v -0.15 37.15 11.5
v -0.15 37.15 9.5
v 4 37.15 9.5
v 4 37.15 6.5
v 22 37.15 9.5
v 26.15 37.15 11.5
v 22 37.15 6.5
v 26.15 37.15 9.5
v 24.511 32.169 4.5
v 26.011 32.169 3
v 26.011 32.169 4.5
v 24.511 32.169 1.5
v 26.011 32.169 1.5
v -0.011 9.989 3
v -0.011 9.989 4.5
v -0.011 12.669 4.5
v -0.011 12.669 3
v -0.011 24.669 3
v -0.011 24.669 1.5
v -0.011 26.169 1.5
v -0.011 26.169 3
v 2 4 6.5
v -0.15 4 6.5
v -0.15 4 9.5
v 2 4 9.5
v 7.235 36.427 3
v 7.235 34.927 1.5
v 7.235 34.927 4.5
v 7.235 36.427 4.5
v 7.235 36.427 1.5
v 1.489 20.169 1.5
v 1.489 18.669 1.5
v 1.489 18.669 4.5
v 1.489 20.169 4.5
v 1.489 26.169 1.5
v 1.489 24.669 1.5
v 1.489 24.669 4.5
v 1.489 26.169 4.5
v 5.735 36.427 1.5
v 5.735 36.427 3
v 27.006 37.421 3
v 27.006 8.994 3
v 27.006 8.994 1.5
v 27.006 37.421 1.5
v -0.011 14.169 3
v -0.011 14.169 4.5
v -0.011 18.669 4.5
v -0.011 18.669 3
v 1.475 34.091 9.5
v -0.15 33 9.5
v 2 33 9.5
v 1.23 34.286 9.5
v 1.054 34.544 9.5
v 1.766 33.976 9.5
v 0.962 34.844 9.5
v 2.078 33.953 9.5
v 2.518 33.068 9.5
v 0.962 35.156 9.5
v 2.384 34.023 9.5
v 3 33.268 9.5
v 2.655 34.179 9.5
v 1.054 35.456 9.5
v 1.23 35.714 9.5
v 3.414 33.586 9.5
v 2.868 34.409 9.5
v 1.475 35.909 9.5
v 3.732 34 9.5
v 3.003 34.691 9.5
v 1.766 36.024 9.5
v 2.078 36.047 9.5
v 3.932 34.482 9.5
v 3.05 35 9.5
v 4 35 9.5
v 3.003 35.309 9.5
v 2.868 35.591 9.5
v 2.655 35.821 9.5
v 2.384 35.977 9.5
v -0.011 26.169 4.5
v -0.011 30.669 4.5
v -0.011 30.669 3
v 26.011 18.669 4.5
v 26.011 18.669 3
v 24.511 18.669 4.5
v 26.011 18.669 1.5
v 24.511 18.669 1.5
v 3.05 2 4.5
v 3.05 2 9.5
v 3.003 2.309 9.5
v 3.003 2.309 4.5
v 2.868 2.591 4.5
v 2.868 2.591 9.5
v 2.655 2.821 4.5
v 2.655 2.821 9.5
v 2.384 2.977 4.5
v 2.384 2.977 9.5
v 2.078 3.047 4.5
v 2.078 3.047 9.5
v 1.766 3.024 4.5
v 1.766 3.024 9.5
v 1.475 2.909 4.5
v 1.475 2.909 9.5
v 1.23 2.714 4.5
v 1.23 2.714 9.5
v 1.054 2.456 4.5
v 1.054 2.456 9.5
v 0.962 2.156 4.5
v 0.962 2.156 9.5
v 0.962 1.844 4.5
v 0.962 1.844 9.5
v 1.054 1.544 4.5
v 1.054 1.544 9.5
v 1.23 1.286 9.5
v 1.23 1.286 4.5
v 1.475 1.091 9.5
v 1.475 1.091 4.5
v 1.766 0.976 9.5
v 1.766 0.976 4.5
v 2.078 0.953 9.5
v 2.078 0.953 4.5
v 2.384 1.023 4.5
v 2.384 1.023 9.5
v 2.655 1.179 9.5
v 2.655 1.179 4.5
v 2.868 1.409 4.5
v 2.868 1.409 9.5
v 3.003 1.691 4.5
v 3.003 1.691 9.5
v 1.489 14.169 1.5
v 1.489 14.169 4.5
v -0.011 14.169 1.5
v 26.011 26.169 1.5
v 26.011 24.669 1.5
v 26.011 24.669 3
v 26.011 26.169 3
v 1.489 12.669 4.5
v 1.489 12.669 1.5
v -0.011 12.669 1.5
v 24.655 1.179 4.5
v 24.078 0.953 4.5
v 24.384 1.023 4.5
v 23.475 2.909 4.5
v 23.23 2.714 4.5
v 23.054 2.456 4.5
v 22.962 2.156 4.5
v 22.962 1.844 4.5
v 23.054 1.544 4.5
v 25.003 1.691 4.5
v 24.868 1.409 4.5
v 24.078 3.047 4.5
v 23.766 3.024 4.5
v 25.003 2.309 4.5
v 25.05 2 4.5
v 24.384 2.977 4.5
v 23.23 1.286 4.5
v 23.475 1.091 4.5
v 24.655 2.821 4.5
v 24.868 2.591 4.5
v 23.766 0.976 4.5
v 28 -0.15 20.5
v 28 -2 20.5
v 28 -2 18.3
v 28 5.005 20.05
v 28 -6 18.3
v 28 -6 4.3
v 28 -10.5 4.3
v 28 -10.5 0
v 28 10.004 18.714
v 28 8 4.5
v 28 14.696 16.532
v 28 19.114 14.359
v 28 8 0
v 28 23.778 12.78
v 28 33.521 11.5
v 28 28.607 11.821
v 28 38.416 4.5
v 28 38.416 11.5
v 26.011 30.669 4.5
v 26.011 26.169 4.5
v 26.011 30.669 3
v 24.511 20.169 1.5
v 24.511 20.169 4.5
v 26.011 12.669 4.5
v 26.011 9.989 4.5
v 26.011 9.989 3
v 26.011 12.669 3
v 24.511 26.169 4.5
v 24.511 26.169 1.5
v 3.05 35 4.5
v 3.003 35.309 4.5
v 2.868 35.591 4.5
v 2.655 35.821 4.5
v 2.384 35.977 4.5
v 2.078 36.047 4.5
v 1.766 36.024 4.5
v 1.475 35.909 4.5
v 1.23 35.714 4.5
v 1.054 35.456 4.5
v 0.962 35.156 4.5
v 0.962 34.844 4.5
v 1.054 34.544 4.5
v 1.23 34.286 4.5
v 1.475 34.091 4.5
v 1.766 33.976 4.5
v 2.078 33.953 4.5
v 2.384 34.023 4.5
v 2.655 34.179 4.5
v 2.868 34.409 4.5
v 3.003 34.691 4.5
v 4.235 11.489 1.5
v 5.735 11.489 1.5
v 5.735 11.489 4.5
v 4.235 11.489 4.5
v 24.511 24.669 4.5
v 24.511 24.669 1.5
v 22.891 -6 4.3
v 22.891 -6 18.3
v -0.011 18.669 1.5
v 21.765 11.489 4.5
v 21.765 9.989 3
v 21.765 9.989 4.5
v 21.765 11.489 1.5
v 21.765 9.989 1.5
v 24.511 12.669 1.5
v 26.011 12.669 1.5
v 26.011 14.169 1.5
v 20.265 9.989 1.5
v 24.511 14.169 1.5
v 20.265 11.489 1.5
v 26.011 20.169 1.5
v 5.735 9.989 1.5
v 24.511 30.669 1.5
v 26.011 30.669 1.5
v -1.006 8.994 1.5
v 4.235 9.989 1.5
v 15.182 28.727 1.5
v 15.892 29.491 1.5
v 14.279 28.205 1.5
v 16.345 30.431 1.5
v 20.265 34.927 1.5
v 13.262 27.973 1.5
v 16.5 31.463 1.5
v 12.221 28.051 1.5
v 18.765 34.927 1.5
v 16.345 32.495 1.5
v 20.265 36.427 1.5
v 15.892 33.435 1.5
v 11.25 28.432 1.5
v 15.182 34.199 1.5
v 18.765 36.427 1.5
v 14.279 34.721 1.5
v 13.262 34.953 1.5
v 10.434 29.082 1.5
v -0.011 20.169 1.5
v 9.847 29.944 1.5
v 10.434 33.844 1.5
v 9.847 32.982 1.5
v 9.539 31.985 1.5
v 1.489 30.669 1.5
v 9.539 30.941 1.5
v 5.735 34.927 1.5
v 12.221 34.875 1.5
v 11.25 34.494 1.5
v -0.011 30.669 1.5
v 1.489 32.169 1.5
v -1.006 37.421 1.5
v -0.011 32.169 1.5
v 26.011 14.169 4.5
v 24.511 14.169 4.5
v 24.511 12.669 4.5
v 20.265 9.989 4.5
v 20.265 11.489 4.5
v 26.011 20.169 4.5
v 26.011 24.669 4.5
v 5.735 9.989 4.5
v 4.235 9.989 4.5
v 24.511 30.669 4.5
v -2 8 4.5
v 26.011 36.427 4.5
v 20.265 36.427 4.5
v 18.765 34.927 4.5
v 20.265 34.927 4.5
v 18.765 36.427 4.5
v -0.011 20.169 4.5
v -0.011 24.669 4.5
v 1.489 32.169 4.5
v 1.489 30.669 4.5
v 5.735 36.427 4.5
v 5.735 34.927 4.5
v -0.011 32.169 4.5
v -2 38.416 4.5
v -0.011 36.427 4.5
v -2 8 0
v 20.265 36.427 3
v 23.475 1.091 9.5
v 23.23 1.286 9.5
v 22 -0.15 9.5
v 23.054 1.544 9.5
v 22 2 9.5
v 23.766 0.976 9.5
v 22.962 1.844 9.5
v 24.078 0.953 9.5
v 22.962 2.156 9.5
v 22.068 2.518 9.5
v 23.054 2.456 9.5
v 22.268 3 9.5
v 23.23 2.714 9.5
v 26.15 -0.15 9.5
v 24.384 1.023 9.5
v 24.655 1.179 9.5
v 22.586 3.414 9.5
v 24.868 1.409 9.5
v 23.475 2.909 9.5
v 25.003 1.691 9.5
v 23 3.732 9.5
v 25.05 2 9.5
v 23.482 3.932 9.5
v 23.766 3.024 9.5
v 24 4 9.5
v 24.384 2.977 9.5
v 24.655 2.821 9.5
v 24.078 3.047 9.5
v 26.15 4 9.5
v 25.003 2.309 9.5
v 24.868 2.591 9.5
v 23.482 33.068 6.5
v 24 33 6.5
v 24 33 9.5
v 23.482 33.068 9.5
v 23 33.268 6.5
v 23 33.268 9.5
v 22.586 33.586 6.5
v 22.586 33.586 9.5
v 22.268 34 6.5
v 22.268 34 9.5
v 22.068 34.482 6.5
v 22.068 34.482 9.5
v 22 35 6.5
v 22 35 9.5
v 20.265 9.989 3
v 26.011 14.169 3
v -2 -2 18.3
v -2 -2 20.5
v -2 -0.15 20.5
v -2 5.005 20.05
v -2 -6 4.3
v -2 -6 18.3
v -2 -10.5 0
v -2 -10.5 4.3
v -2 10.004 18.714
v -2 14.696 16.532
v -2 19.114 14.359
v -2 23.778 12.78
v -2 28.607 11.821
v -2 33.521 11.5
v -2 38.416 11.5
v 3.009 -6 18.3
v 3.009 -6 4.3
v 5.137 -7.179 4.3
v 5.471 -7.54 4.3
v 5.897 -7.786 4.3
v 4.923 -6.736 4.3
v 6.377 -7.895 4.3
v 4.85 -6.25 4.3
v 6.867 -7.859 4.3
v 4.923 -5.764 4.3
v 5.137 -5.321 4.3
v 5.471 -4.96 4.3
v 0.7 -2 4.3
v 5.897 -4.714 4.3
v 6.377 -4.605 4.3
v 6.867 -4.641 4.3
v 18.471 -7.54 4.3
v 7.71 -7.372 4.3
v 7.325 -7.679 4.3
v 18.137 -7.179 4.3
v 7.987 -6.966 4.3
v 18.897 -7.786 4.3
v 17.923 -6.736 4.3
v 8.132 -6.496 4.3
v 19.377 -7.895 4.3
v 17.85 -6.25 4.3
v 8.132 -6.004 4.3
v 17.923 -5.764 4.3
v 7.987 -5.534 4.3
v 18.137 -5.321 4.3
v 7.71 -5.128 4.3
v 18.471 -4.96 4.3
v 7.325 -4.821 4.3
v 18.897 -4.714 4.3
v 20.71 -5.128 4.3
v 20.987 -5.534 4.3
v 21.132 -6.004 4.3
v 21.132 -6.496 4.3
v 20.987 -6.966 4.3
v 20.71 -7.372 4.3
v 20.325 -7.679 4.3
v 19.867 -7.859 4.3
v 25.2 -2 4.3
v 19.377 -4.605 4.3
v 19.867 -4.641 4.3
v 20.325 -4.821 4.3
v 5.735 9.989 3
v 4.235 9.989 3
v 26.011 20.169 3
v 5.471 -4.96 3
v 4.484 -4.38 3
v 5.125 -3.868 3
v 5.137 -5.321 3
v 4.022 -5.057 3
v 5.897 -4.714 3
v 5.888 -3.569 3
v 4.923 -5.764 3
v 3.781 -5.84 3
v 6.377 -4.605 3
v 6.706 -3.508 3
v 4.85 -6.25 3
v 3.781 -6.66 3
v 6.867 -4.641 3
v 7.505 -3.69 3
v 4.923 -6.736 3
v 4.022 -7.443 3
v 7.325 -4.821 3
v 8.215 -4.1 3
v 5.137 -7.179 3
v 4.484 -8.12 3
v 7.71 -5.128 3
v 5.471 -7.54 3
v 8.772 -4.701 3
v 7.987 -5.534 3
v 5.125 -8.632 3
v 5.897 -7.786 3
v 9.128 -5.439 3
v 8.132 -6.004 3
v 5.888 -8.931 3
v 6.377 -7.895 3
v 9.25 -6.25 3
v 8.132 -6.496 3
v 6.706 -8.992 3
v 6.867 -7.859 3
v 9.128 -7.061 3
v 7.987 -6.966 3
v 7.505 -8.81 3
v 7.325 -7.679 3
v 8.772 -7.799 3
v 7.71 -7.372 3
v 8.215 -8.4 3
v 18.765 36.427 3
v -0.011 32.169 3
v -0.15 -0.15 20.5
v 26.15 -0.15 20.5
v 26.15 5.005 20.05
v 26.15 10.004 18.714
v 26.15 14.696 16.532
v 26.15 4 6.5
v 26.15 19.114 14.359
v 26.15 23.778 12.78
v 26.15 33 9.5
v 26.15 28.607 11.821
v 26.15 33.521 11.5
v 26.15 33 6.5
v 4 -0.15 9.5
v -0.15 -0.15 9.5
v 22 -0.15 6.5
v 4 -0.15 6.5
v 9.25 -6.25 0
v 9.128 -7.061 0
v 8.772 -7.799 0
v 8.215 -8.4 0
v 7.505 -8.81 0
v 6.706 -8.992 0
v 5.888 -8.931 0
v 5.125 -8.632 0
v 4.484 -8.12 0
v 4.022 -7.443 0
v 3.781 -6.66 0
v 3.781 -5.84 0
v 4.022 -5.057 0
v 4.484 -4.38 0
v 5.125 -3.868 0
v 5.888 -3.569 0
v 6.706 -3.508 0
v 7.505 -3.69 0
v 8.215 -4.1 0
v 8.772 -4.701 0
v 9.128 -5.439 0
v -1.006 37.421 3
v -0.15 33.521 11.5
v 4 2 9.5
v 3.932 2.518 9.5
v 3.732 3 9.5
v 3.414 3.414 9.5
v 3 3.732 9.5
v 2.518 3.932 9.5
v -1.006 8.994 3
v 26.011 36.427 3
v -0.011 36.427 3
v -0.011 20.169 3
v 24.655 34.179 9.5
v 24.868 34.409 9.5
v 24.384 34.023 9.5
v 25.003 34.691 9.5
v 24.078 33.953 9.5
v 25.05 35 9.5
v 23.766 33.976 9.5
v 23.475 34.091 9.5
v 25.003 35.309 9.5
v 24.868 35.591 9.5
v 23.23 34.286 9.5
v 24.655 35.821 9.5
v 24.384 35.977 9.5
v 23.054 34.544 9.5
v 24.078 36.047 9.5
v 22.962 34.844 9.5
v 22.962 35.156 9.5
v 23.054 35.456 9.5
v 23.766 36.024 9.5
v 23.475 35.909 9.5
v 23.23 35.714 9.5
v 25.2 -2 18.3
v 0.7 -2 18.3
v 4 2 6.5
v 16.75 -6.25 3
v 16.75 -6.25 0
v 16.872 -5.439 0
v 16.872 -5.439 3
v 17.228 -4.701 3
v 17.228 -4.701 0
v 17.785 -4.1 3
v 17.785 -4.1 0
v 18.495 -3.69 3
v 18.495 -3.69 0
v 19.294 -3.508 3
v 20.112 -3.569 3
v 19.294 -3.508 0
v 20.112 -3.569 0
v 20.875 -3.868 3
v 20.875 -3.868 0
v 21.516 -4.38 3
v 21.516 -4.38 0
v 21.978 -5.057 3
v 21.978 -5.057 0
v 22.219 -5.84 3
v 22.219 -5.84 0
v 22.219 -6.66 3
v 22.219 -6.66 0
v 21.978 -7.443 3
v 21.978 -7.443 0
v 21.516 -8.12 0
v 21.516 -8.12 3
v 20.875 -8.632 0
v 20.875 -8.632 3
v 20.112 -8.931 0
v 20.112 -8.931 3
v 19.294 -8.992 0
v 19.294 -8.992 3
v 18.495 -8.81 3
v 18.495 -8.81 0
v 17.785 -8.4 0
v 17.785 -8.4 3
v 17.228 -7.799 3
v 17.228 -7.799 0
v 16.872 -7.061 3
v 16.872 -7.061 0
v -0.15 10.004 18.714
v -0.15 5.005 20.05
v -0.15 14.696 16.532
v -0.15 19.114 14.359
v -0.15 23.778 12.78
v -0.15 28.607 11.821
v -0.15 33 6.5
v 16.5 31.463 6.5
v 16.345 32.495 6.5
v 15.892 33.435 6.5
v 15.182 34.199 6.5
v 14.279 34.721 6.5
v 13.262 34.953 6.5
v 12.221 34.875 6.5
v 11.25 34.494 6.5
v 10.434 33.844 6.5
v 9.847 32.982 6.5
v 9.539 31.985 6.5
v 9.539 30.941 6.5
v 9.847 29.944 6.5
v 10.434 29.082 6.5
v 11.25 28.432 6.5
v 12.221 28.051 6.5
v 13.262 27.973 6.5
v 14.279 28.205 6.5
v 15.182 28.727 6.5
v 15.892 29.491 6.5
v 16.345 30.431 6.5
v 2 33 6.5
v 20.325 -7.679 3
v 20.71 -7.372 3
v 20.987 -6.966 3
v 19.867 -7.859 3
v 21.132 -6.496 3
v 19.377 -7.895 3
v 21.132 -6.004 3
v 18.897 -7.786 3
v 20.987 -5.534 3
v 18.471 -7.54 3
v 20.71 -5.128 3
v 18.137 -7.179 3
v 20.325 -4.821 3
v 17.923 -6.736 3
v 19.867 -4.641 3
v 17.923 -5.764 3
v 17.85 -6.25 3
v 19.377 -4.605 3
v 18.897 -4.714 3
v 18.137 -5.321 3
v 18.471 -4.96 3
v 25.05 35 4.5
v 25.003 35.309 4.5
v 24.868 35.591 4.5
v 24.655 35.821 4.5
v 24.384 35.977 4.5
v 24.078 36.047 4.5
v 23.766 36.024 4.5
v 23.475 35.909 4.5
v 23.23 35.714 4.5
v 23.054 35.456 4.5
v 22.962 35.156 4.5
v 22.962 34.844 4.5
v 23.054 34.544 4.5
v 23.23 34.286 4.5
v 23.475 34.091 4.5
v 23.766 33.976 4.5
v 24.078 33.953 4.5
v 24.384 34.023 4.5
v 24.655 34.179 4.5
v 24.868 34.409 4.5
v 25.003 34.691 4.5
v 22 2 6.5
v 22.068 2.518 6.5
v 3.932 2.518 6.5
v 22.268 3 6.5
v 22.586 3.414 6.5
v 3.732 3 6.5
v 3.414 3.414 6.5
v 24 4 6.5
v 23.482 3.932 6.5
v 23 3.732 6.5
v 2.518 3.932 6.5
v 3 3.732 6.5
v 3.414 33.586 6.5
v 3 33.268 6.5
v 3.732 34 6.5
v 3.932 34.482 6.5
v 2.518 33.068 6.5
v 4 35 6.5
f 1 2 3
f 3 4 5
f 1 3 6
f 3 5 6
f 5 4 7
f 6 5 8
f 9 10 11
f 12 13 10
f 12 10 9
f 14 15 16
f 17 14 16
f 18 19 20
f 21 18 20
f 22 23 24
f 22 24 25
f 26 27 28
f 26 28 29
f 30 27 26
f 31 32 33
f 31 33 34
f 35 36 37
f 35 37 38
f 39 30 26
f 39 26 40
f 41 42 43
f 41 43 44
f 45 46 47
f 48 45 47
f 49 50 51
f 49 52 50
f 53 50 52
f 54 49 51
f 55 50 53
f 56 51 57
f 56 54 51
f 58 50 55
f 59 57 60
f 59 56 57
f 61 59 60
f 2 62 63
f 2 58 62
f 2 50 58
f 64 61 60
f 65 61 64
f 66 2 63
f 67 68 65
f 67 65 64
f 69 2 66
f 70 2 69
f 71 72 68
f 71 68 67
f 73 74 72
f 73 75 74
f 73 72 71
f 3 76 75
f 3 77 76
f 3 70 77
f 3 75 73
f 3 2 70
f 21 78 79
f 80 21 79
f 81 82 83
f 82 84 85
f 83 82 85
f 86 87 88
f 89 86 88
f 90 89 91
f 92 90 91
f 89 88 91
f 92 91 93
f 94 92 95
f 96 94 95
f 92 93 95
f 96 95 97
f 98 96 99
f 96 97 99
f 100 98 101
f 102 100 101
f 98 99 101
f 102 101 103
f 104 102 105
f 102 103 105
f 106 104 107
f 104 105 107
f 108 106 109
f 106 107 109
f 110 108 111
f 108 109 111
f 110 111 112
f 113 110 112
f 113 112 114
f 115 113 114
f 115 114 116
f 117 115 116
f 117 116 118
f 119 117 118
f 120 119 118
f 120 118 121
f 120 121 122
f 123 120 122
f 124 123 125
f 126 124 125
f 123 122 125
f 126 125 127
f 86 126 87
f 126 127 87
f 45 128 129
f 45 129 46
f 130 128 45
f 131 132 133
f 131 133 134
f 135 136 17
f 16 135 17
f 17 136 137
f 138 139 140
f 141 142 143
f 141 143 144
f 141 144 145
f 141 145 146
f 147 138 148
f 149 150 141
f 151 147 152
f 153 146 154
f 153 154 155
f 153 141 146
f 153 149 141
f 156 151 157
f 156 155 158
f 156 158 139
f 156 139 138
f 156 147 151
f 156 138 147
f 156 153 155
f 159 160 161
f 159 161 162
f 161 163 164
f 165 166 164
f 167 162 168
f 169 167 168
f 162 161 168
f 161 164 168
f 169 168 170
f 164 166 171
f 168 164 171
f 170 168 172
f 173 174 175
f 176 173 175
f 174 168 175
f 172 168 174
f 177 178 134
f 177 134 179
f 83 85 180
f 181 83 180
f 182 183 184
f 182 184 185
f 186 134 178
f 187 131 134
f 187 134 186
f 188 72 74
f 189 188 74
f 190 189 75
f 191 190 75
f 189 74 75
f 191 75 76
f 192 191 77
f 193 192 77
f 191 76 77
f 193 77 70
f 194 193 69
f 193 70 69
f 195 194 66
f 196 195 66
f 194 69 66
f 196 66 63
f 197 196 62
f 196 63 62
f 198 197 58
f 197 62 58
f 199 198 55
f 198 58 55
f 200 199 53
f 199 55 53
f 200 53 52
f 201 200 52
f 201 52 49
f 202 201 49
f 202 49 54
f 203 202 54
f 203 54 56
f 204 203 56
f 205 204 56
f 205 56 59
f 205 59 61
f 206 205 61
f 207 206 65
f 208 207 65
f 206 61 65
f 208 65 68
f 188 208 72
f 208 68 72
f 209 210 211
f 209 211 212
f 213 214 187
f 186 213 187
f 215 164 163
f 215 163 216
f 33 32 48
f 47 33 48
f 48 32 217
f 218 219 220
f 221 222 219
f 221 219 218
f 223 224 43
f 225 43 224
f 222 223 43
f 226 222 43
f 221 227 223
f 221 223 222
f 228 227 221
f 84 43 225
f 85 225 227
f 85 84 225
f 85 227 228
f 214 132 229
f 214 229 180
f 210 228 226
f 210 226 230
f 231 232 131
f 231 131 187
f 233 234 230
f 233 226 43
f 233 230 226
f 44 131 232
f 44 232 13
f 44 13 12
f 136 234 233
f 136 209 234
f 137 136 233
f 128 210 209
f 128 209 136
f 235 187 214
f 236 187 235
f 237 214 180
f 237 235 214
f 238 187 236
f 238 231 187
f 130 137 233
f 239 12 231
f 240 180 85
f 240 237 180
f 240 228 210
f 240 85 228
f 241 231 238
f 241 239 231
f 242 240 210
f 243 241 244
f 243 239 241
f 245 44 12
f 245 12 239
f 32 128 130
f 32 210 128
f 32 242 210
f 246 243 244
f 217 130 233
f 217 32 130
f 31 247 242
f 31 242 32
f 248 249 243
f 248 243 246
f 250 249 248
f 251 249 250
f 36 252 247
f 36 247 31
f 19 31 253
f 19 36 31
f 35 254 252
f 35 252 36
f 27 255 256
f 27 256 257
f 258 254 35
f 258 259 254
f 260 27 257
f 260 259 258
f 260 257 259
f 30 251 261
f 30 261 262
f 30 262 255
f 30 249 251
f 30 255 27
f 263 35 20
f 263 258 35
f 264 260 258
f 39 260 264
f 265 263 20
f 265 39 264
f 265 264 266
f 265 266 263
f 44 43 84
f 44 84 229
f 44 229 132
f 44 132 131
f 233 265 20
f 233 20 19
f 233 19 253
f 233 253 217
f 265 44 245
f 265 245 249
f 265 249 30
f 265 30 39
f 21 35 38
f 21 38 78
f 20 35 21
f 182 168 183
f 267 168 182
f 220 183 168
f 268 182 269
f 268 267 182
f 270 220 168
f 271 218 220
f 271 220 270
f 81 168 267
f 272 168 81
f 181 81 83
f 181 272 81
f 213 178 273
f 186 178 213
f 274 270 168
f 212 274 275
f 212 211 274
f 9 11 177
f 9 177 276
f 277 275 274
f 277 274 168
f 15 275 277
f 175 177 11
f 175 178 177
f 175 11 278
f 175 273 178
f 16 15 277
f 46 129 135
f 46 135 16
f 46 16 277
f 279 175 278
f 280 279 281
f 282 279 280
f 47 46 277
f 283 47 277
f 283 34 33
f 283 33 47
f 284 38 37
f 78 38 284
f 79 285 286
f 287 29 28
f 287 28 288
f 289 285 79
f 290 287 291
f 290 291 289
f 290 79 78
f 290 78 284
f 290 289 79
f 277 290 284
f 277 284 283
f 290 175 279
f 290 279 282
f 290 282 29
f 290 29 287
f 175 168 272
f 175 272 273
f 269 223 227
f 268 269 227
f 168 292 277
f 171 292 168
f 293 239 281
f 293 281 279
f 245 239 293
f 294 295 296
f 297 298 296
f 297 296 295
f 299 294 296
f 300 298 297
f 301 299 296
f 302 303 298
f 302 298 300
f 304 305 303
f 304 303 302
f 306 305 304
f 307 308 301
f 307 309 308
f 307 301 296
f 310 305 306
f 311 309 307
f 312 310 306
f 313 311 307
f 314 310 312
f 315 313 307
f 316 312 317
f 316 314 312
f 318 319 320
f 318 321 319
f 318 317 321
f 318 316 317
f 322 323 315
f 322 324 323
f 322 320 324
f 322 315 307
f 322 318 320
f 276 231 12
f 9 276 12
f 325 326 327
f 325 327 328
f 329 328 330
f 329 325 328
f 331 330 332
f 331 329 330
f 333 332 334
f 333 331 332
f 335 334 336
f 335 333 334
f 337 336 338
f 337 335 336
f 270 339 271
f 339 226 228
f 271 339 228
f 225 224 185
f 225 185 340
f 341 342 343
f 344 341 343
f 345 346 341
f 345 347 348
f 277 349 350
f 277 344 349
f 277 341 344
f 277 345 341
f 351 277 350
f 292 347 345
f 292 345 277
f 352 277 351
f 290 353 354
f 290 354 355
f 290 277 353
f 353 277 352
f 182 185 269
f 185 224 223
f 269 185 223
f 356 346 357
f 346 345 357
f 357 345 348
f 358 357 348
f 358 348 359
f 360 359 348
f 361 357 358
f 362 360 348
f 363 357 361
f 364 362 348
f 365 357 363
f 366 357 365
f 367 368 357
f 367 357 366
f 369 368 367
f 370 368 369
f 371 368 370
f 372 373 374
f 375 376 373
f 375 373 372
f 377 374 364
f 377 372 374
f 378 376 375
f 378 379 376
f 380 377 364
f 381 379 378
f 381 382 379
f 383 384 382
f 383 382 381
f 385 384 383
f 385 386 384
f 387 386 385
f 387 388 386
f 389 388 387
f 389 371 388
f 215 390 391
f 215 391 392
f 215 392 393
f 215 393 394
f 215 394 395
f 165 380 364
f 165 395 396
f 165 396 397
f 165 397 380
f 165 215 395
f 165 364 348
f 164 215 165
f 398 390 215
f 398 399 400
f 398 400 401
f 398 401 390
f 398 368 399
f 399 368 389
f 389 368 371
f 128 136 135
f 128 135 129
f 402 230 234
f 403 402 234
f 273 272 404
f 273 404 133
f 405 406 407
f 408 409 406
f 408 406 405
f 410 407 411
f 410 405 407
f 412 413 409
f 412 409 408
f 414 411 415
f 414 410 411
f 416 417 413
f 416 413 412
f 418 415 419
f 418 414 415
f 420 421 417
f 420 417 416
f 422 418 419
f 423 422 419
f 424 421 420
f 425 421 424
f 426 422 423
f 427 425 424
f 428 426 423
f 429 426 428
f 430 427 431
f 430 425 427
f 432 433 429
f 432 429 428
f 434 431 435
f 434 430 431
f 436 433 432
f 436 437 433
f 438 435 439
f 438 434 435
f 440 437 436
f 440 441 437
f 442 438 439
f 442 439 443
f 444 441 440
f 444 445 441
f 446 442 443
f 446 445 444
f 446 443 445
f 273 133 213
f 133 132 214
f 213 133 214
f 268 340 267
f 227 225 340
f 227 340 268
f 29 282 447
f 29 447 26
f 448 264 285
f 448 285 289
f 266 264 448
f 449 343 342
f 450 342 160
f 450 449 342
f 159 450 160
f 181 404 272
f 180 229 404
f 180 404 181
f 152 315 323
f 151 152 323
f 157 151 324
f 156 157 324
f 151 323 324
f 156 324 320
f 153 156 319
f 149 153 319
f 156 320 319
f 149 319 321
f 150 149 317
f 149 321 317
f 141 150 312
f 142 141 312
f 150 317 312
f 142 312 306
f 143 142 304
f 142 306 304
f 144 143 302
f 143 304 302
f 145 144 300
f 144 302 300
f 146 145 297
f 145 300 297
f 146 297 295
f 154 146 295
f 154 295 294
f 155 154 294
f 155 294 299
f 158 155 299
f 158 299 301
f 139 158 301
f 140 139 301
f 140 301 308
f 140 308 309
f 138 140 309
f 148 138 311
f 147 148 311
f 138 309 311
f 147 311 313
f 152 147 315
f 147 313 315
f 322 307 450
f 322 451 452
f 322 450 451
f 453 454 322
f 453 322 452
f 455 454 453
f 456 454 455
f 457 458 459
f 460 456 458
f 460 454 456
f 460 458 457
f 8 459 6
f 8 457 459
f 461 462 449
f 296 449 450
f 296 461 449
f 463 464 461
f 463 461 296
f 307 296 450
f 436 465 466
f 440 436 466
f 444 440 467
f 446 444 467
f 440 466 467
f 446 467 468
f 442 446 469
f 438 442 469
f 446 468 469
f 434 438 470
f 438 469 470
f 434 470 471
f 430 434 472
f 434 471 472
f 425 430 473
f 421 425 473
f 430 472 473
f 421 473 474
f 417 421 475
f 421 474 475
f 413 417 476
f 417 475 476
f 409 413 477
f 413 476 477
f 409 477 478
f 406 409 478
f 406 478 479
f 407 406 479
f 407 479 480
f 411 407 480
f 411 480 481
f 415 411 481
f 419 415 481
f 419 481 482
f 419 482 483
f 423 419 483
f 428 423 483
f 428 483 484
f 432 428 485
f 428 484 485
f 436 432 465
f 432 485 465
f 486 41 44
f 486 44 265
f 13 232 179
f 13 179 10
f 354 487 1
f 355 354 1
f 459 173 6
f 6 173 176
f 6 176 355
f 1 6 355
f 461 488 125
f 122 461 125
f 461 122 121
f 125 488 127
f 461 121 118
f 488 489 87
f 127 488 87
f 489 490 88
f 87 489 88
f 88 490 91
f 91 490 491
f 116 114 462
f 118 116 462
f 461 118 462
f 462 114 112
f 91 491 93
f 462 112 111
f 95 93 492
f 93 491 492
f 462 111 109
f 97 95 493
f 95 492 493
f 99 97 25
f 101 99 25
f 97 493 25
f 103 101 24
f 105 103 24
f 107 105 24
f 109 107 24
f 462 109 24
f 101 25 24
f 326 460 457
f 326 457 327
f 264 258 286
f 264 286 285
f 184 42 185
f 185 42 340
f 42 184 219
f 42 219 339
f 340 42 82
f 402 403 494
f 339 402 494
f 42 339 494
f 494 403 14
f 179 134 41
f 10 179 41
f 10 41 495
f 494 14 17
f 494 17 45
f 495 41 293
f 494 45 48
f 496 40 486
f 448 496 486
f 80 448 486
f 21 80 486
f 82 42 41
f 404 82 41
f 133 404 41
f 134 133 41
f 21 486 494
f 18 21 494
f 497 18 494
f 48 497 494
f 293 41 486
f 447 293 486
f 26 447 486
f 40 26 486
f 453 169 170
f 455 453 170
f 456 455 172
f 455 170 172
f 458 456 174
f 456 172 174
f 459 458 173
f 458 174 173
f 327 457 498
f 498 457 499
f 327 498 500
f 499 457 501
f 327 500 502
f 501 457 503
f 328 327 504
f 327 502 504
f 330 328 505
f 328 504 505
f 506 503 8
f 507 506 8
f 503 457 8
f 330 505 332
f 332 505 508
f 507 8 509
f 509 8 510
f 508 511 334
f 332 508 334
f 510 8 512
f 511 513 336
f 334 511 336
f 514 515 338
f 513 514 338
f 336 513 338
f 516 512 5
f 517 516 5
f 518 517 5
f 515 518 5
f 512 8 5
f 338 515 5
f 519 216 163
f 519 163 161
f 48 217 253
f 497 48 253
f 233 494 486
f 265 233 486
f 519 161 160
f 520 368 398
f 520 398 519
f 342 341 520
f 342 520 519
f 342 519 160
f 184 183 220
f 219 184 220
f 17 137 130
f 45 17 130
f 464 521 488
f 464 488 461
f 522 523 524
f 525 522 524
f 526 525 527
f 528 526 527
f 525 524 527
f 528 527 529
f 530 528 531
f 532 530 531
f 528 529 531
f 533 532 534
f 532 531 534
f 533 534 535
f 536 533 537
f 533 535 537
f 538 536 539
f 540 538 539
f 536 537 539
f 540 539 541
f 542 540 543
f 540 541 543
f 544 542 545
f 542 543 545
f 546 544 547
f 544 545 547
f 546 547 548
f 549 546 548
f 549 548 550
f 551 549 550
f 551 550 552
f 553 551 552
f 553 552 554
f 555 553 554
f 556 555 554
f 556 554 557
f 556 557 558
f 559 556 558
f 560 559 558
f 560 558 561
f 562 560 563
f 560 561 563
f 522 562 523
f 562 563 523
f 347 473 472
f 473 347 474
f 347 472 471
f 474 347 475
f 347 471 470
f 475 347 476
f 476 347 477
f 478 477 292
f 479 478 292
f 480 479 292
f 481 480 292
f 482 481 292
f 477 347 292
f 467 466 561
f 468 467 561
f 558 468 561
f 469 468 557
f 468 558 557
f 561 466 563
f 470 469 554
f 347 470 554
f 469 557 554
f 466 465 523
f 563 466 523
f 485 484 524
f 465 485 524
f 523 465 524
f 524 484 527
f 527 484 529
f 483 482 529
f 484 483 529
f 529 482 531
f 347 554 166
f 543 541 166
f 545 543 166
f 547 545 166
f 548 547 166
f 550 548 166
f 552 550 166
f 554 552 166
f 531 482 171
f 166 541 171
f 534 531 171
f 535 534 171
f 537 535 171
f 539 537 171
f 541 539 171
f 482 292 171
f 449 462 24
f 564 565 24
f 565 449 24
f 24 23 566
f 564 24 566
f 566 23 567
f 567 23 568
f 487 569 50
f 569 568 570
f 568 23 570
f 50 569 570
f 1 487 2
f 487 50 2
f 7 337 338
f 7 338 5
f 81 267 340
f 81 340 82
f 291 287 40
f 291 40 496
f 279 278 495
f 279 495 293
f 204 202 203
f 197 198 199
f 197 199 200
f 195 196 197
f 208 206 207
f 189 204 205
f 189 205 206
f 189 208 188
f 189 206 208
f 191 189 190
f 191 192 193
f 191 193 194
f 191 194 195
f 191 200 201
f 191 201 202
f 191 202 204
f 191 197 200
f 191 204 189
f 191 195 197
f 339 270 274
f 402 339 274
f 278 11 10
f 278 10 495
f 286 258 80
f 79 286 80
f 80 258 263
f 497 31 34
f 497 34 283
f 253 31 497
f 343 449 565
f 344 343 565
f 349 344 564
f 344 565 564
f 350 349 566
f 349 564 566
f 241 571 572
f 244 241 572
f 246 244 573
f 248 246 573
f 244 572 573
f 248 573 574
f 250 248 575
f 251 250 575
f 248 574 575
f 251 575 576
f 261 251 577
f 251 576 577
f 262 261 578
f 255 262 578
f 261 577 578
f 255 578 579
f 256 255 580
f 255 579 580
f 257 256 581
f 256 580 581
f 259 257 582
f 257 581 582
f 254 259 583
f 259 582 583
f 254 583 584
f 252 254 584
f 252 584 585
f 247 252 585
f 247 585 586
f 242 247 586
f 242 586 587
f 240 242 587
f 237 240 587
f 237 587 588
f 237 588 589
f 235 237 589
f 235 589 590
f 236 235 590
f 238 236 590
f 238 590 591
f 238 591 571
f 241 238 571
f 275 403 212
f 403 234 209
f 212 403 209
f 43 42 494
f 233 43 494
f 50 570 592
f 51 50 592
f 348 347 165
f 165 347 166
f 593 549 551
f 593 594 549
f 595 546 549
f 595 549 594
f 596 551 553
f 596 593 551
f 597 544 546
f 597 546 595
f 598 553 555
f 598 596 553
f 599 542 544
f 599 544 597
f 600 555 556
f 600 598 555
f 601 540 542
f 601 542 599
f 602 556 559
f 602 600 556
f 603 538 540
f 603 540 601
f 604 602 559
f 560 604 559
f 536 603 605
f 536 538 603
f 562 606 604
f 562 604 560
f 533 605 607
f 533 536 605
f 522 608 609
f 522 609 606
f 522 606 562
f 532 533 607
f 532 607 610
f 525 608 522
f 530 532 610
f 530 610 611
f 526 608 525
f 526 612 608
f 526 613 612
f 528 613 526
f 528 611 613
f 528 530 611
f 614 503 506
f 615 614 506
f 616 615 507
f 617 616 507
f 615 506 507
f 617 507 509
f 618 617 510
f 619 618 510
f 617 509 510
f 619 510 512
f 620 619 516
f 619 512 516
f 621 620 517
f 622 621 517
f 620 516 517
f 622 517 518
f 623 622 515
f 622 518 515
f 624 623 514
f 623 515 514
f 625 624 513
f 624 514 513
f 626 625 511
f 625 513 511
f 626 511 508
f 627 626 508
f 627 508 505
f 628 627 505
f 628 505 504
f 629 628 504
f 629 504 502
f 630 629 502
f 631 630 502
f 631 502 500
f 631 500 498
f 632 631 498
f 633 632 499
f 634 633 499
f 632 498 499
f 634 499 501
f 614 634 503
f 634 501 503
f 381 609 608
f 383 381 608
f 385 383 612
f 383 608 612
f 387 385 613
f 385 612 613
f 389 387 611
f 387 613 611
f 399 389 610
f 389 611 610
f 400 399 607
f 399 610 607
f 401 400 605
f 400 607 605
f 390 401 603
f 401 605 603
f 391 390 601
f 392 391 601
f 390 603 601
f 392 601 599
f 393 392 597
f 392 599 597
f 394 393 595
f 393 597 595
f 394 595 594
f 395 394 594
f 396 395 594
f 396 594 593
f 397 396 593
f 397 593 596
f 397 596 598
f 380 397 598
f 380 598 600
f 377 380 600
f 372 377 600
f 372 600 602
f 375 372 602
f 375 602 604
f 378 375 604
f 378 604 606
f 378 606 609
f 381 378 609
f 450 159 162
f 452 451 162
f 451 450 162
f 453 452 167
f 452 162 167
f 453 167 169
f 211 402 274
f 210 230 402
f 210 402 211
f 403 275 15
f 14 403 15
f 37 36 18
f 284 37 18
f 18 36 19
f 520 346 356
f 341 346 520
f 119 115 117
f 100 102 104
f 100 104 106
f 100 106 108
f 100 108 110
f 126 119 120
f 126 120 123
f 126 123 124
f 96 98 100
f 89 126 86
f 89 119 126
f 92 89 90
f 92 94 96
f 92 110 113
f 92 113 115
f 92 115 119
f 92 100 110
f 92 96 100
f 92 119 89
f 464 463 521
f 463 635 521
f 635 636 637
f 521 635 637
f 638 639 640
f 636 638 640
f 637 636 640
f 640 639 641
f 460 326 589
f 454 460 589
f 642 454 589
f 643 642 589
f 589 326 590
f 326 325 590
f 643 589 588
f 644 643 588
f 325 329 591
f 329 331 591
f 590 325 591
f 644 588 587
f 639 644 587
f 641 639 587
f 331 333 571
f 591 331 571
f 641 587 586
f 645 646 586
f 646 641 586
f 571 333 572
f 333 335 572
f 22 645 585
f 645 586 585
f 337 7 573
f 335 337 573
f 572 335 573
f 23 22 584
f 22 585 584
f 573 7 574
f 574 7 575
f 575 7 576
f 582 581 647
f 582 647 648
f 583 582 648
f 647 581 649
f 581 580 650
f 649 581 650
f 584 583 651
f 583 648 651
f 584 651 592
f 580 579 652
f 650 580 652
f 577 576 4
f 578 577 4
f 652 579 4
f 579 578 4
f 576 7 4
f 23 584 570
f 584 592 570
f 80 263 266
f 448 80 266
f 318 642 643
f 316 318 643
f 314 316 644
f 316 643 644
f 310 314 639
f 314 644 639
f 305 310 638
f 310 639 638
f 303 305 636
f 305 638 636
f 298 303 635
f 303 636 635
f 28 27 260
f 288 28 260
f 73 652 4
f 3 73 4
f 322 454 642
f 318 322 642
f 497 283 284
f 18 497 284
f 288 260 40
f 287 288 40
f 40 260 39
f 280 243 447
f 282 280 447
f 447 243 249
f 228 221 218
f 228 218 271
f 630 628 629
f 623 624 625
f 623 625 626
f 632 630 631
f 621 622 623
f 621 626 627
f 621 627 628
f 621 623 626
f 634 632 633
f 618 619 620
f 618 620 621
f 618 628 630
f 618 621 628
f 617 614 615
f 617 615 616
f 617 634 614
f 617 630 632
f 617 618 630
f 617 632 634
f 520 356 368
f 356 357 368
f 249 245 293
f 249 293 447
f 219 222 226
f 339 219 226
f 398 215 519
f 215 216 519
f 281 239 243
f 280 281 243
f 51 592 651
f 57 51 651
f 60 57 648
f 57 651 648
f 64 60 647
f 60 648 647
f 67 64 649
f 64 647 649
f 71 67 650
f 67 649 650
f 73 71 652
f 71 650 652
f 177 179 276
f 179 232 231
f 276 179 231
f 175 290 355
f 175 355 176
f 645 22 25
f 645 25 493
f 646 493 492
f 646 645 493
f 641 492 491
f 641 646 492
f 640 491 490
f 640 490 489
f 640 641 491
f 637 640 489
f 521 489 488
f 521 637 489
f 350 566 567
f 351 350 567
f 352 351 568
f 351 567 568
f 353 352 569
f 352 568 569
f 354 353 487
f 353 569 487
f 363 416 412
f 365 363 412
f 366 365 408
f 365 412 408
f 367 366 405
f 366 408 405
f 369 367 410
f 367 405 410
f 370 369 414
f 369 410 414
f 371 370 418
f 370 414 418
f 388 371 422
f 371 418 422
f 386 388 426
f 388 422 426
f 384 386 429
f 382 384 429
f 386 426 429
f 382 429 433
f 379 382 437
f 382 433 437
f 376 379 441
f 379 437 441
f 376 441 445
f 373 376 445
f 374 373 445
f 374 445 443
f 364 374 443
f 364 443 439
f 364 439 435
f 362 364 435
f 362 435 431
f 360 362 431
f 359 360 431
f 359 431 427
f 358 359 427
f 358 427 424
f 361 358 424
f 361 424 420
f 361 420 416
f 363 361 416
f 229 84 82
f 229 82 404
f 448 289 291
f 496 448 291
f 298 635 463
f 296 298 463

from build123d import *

# Parameters (mm, degrees)
SKETCH2_W             = 30
SKETCH2_H             = 18.5
BOSS_EXTRUDE1_DEPTH   = 4.5
BOSS_EXTRUDE2_DEPTH   = 2
SKETCH4_W             = 26.3
SKETCH4_H             = 37.3
BOSS_EXTRUDE3_DEPTH   = 12
SKETCH5_W             = 30
SKETCH5_H             = 40.415903306
SKETCH5_W_2           = 26.3
SKETCH5_H_2           = 37.3
BOSS_EXTRUDE4_DEPTH   = 2
CUT_EXTRUDE1_DEPTH    = 53.877515324
SKETCH7_R             = 2.75
CUT_EXTRUDE2_DEPTH    = 3
SKETCH8_R             = 1.65
CUT_EXTRUDE3_DEPTH    = 51.656012741
SKETCH9_W             = 0.2
SKETCH9_H             = 4
TOLERANCE_CUT1_DEPTH  = 53.877515324
TOLERANCE_CUT2_DEPTH  = 0.2
BOSS_EXTRUDE5_DEPTH   = 3
SKETCH12_W            = 26.022193388
SKETCH12_H            = 26.438096694
BOSS_EXTRUDE6_DEPTH   = 1.5
SKETCH13_W            = 28.011096694
SKETCH13_H            = 28.427
BOSS_EXTRUDE7_DEPTH   = 1.5
SKETCH14_R            = 3.5
CUT_EXTRUDE6_DEPTH    = 50.555843518
SKETCH15_R            = 1.05
PCB_MOUNT_HOLES_DEPTH = 5
SKETCH16_W            = 1.5
SKETCH16_H            = 1.5
CUT_EXTRUDE8_DEPTH    = 3


with BuildPart() as part:
    # Sketch2 → Boss-Extrude1 (new body)
    with BuildSketch(Plane.XY):
        with Locations((13, -1.25)):
            Rectangle(SKETCH2_W, SKETCH2_H)
    extrude(amount=BOSS_EXTRUDE1_DEPTH)

    # Sketch3 → Boss-Extrude2 (add)
    with BuildSketch(Plane.XY.offset(4.5)):
        Polygon((-2, 38.415903306), (28, 38.415903306), (28, -6), (22.890598923, -6), (25.2, -2), (0.7, -2), (3.009401077, -6), (-2, -6), align=None)
    extrude(amount=BOSS_EXTRUDE2_DEPTH)

    # Sketch4 → Boss-Extrude3 (add)
    with BuildSketch(Plane.XY.offset(6.5)):
        Polygon((-2, 38.415903306), (-2, -6), (3.009401077, -6), (0.7, -2), (25.2, -2), (22.890598923, -6), (28, -6), (28, 38.415903306), align=None)
        with Locations((13, 18.5)):
            Rectangle(SKETCH4_W, SKETCH4_H, mode=Mode.SUBTRACT)
    extrude(amount=BOSS_EXTRUDE3_DEPTH)

    # Sketch5 → Boss-Extrude4 (add)
    with BuildSketch(Plane.XY.offset(18.5)):
        with Locations((13, 18.207951653)):
            Rectangle(SKETCH5_W, SKETCH5_H)
        with Locations((13, 18.5)):
            Rectangle(SKETCH5_W_2, SKETCH5_H_2, mode=Mode.SUBTRACT)
    extrude(amount=BOSS_EXTRUDE4_DEPTH)

    # Sketch6 → Cut-Extrude1 (cut, through all)
    with BuildSketch(Plane(origin=(28, 0, 0), x_dir=(0, 0, -1), z_dir=(1, 0, 0))):
        with BuildLine():
            Line((-11.5, 38.415903306), (-29.920257518, 38.415903306))
            Line((-29.920257518, 38.415903306), (-29.920257518, -0.15))
            Line((-29.920257518, -0.15), (-20.5, -0.15))
            ThreePointArc((-20.5, -0.15), (-19.490822016, 7.533583379), (-16.531743455, 14.695967606))
            ThreePointArc((-16.531743455, 14.695967606), (-12.779636198, 23.777860258), (-11.5, 33.520632668))
            Line((-11.5, 33.520632668), (-11.5, 38.415903306))
        make_face()
    extrude(amount=-CUT_EXTRUDE1_DEPTH, mode=Mode.SUBTRACT)

    # Sketch7 → Cut-Extrude2 (cut)
    with BuildSketch(Plane(origin=(0, 0, 0), x_dir=(-1, 0, 0), z_dir=(0, 0, -1))):
        with Locations((-19.5, -6.25)):
            Circle(SKETCH7_R)
        with Locations(Location((-6.5, -6.25, 0), (0, 0, 180))):
            Circle(SKETCH7_R)
    extrude(amount=-CUT_EXTRUDE2_DEPTH, mode=Mode.SUBTRACT)

    # Sketch8 → Cut-Extrude3 (cut, through all)
    with BuildSketch(Plane(origin=(0, 0, 3), x_dir=(-1, 0, 0), z_dir=(0, 0, -1))):
        with Locations((-19.5, -6.25)):
            Circle(SKETCH8_R)
        with Locations((-6.5, -6.25)):
            Circle(SKETCH8_R)
    extrude(amount=-CUT_EXTRUDE3_DEPTH, mode=Mode.SUBTRACT)

    # Sketch9 → tolerance_cut1 (cut, through all)
    with BuildSketch(Plane.ZY.offset(2)):
        with Locations((18.4, -4)):
            Rectangle(SKETCH9_W, SKETCH9_H)
    extrude(amount=-TOLERANCE_CUT1_DEPTH, mode=Mode.SUBTRACT)

    # Sketch10 → tolerance_cut2 (cut)
    with BuildSketch(Plane.XY.offset(4.5)):
        Polygon((28, -6), (22.890598923, -6), (25.2, -2), (0.7, -2), (3.009401077, -6), (-2, -6), (-2, -10.5), (28, -10.5), align=None)
    extrude(amount=-TOLERANCE_CUT2_DEPTH, mode=Mode.SUBTRACT)

    # Sketch11 → Boss-Extrude5 (add)
    with BuildSketch(Plane.XY.offset(6.5)):
        with BuildLine():
            Line((4, 35), (4, 37.15))
            Line((4, 37.15), (-0.15, 37.15))
            Line((-0.15, 37.15), (-0.15, 33))
            Line((-0.15, 33), (2, 33))
            ThreePointArc((2, 33), (3.414213562, 33.585786438), (4, 35))
        make_face()
        with BuildLine():
            Line((26.15, 33), (24, 33))
            ThreePointArc((24, 33), (22.585786438, 33.585786438), (22, 35))
            Line((22, 35), (22, 37.15))
            Line((22, 37.15), (26.15, 37.15))
            Line((26.15, 37.15), (26.15, 33))
        make_face()
        with BuildLine():
            Line((26.15, 4), (24, 4))
            ThreePointArc((24, 4), (22.585786438, 3.414213562), (22, 2))
            Line((22, 2), (22, -0.15))
            Line((22, -0.15), (26.15, -0.15))
            Line((26.15, -0.15), (26.15, 4))
        make_face()
        with BuildLine():
            Line((-0.15, 4), (2, 4))
            ThreePointArc((2, 4), (3.414213562, 3.414213562), (4, 2))
            Line((4, 2), (4, -0.15))
            Line((4, -0.15), (-0.15, -0.15))
            Line((-0.15, -0.15), (-0.15, 4))
        make_face()
    extrude(amount=BOSS_EXTRUDE5_DEPTH)

    # Sketch12 → Boss-Extrude6 (add)
    with BuildSketch(Plane(origin=(0, 0, 4.5), x_dir=(-1, 0, 0), z_dir=(0, 0, -1))):
        with Locations((-13, 23.207951653)):
            Rectangle(SKETCH12_W, SKETCH12_H)
    extrude(amount=BOSS_EXTRUDE6_DEPTH)

    # Sketch13 → Boss-Extrude7 (add)
    with BuildSketch(Plane(origin=(0, 0, 3), x_dir=(-1, 0, 0), z_dir=(0, 0, -1))):
        with Locations((-13, 23.207951653)):
            Rectangle(SKETCH13_W, SKETCH13_H)
    extrude(amount=BOSS_EXTRUDE7_DEPTH)

    # Sketch14 → Cut-Extrude6 (cut, through all)
    with BuildSketch(Plane.XY.offset(6.5)):
        with Locations((13, 31.463)):
            Circle(SKETCH14_R)
    extrude(amount=-CUT_EXTRUDE6_DEPTH, mode=Mode.SUBTRACT)

    # Sketch15 → pcb_mount_holes (cut)
    with BuildSketch(Plane.XY.offset(9.5)):
        with Locations((2, 35)):
            Circle(SKETCH15_R)
        with Locations((24, 35)):
            Circle(SKETCH15_R)
        with Locations((24, 2)):
            Circle(SKETCH15_R)
        with Locations((2, 2)):
            Circle(SKETCH15_R)
    extrude(amount=-PCB_MOUNT_HOLES_DEPTH, mode=Mode.SUBTRACT)

    # Sketch16 → Cut-Extrude8 (cut)
    with BuildSketch(Plane(origin=(0, 0, 1.5), x_dir=(-1, 0, 0), z_dir=(0, 0, -1))):
        with Locations((-25.261096694, 25.419380652)):
            Rectangle(SKETCH16_W, SKETCH16_H)
        with Locations((-25.261096694, 31.419380652)):
            Rectangle(SKETCH16_W, SKETCH16_H)
        with Locations((-25.261096694, 19.419380652)):
            Rectangle(SKETCH16_W, SKETCH16_H)
        with Locations((-25.261096694, 13.419380652)):
            Rectangle(SKETCH16_W, SKETCH16_H)
        with Locations((-21.014935628, 10.738903306)):
            Rectangle(SKETCH16_W, SKETCH16_H)
        with Locations((-19.514935628, 35.677)):
            Rectangle(SKETCH16_W, SKETCH16_H)
        with Locations((-4.985064372, 10.738903306)):
            Rectangle(SKETCH16_W, SKETCH16_H)
        with Locations((-0.738903306, 13.419380652)):
            Rectangle(SKETCH16_W, SKETCH16_H)
        with Locations((-0.738903306, 19.419380652)):
            Rectangle(SKETCH16_W, SKETCH16_H)
        with Locations((-0.738903306, 25.419380652)):
            Rectangle(SKETCH16_W, SKETCH16_H)
        with Locations((-0.738903306, 31.419380652)):
            Rectangle(SKETCH16_W, SKETCH16_H)
        with Locations((-6.485064372, 35.677)):
            Rectangle(SKETCH16_W, SKETCH16_H)
    extrude(amount=-CUT_EXTRUDE8_DEPTH, mode=Mode.SUBTRACT)


solid = part.part
